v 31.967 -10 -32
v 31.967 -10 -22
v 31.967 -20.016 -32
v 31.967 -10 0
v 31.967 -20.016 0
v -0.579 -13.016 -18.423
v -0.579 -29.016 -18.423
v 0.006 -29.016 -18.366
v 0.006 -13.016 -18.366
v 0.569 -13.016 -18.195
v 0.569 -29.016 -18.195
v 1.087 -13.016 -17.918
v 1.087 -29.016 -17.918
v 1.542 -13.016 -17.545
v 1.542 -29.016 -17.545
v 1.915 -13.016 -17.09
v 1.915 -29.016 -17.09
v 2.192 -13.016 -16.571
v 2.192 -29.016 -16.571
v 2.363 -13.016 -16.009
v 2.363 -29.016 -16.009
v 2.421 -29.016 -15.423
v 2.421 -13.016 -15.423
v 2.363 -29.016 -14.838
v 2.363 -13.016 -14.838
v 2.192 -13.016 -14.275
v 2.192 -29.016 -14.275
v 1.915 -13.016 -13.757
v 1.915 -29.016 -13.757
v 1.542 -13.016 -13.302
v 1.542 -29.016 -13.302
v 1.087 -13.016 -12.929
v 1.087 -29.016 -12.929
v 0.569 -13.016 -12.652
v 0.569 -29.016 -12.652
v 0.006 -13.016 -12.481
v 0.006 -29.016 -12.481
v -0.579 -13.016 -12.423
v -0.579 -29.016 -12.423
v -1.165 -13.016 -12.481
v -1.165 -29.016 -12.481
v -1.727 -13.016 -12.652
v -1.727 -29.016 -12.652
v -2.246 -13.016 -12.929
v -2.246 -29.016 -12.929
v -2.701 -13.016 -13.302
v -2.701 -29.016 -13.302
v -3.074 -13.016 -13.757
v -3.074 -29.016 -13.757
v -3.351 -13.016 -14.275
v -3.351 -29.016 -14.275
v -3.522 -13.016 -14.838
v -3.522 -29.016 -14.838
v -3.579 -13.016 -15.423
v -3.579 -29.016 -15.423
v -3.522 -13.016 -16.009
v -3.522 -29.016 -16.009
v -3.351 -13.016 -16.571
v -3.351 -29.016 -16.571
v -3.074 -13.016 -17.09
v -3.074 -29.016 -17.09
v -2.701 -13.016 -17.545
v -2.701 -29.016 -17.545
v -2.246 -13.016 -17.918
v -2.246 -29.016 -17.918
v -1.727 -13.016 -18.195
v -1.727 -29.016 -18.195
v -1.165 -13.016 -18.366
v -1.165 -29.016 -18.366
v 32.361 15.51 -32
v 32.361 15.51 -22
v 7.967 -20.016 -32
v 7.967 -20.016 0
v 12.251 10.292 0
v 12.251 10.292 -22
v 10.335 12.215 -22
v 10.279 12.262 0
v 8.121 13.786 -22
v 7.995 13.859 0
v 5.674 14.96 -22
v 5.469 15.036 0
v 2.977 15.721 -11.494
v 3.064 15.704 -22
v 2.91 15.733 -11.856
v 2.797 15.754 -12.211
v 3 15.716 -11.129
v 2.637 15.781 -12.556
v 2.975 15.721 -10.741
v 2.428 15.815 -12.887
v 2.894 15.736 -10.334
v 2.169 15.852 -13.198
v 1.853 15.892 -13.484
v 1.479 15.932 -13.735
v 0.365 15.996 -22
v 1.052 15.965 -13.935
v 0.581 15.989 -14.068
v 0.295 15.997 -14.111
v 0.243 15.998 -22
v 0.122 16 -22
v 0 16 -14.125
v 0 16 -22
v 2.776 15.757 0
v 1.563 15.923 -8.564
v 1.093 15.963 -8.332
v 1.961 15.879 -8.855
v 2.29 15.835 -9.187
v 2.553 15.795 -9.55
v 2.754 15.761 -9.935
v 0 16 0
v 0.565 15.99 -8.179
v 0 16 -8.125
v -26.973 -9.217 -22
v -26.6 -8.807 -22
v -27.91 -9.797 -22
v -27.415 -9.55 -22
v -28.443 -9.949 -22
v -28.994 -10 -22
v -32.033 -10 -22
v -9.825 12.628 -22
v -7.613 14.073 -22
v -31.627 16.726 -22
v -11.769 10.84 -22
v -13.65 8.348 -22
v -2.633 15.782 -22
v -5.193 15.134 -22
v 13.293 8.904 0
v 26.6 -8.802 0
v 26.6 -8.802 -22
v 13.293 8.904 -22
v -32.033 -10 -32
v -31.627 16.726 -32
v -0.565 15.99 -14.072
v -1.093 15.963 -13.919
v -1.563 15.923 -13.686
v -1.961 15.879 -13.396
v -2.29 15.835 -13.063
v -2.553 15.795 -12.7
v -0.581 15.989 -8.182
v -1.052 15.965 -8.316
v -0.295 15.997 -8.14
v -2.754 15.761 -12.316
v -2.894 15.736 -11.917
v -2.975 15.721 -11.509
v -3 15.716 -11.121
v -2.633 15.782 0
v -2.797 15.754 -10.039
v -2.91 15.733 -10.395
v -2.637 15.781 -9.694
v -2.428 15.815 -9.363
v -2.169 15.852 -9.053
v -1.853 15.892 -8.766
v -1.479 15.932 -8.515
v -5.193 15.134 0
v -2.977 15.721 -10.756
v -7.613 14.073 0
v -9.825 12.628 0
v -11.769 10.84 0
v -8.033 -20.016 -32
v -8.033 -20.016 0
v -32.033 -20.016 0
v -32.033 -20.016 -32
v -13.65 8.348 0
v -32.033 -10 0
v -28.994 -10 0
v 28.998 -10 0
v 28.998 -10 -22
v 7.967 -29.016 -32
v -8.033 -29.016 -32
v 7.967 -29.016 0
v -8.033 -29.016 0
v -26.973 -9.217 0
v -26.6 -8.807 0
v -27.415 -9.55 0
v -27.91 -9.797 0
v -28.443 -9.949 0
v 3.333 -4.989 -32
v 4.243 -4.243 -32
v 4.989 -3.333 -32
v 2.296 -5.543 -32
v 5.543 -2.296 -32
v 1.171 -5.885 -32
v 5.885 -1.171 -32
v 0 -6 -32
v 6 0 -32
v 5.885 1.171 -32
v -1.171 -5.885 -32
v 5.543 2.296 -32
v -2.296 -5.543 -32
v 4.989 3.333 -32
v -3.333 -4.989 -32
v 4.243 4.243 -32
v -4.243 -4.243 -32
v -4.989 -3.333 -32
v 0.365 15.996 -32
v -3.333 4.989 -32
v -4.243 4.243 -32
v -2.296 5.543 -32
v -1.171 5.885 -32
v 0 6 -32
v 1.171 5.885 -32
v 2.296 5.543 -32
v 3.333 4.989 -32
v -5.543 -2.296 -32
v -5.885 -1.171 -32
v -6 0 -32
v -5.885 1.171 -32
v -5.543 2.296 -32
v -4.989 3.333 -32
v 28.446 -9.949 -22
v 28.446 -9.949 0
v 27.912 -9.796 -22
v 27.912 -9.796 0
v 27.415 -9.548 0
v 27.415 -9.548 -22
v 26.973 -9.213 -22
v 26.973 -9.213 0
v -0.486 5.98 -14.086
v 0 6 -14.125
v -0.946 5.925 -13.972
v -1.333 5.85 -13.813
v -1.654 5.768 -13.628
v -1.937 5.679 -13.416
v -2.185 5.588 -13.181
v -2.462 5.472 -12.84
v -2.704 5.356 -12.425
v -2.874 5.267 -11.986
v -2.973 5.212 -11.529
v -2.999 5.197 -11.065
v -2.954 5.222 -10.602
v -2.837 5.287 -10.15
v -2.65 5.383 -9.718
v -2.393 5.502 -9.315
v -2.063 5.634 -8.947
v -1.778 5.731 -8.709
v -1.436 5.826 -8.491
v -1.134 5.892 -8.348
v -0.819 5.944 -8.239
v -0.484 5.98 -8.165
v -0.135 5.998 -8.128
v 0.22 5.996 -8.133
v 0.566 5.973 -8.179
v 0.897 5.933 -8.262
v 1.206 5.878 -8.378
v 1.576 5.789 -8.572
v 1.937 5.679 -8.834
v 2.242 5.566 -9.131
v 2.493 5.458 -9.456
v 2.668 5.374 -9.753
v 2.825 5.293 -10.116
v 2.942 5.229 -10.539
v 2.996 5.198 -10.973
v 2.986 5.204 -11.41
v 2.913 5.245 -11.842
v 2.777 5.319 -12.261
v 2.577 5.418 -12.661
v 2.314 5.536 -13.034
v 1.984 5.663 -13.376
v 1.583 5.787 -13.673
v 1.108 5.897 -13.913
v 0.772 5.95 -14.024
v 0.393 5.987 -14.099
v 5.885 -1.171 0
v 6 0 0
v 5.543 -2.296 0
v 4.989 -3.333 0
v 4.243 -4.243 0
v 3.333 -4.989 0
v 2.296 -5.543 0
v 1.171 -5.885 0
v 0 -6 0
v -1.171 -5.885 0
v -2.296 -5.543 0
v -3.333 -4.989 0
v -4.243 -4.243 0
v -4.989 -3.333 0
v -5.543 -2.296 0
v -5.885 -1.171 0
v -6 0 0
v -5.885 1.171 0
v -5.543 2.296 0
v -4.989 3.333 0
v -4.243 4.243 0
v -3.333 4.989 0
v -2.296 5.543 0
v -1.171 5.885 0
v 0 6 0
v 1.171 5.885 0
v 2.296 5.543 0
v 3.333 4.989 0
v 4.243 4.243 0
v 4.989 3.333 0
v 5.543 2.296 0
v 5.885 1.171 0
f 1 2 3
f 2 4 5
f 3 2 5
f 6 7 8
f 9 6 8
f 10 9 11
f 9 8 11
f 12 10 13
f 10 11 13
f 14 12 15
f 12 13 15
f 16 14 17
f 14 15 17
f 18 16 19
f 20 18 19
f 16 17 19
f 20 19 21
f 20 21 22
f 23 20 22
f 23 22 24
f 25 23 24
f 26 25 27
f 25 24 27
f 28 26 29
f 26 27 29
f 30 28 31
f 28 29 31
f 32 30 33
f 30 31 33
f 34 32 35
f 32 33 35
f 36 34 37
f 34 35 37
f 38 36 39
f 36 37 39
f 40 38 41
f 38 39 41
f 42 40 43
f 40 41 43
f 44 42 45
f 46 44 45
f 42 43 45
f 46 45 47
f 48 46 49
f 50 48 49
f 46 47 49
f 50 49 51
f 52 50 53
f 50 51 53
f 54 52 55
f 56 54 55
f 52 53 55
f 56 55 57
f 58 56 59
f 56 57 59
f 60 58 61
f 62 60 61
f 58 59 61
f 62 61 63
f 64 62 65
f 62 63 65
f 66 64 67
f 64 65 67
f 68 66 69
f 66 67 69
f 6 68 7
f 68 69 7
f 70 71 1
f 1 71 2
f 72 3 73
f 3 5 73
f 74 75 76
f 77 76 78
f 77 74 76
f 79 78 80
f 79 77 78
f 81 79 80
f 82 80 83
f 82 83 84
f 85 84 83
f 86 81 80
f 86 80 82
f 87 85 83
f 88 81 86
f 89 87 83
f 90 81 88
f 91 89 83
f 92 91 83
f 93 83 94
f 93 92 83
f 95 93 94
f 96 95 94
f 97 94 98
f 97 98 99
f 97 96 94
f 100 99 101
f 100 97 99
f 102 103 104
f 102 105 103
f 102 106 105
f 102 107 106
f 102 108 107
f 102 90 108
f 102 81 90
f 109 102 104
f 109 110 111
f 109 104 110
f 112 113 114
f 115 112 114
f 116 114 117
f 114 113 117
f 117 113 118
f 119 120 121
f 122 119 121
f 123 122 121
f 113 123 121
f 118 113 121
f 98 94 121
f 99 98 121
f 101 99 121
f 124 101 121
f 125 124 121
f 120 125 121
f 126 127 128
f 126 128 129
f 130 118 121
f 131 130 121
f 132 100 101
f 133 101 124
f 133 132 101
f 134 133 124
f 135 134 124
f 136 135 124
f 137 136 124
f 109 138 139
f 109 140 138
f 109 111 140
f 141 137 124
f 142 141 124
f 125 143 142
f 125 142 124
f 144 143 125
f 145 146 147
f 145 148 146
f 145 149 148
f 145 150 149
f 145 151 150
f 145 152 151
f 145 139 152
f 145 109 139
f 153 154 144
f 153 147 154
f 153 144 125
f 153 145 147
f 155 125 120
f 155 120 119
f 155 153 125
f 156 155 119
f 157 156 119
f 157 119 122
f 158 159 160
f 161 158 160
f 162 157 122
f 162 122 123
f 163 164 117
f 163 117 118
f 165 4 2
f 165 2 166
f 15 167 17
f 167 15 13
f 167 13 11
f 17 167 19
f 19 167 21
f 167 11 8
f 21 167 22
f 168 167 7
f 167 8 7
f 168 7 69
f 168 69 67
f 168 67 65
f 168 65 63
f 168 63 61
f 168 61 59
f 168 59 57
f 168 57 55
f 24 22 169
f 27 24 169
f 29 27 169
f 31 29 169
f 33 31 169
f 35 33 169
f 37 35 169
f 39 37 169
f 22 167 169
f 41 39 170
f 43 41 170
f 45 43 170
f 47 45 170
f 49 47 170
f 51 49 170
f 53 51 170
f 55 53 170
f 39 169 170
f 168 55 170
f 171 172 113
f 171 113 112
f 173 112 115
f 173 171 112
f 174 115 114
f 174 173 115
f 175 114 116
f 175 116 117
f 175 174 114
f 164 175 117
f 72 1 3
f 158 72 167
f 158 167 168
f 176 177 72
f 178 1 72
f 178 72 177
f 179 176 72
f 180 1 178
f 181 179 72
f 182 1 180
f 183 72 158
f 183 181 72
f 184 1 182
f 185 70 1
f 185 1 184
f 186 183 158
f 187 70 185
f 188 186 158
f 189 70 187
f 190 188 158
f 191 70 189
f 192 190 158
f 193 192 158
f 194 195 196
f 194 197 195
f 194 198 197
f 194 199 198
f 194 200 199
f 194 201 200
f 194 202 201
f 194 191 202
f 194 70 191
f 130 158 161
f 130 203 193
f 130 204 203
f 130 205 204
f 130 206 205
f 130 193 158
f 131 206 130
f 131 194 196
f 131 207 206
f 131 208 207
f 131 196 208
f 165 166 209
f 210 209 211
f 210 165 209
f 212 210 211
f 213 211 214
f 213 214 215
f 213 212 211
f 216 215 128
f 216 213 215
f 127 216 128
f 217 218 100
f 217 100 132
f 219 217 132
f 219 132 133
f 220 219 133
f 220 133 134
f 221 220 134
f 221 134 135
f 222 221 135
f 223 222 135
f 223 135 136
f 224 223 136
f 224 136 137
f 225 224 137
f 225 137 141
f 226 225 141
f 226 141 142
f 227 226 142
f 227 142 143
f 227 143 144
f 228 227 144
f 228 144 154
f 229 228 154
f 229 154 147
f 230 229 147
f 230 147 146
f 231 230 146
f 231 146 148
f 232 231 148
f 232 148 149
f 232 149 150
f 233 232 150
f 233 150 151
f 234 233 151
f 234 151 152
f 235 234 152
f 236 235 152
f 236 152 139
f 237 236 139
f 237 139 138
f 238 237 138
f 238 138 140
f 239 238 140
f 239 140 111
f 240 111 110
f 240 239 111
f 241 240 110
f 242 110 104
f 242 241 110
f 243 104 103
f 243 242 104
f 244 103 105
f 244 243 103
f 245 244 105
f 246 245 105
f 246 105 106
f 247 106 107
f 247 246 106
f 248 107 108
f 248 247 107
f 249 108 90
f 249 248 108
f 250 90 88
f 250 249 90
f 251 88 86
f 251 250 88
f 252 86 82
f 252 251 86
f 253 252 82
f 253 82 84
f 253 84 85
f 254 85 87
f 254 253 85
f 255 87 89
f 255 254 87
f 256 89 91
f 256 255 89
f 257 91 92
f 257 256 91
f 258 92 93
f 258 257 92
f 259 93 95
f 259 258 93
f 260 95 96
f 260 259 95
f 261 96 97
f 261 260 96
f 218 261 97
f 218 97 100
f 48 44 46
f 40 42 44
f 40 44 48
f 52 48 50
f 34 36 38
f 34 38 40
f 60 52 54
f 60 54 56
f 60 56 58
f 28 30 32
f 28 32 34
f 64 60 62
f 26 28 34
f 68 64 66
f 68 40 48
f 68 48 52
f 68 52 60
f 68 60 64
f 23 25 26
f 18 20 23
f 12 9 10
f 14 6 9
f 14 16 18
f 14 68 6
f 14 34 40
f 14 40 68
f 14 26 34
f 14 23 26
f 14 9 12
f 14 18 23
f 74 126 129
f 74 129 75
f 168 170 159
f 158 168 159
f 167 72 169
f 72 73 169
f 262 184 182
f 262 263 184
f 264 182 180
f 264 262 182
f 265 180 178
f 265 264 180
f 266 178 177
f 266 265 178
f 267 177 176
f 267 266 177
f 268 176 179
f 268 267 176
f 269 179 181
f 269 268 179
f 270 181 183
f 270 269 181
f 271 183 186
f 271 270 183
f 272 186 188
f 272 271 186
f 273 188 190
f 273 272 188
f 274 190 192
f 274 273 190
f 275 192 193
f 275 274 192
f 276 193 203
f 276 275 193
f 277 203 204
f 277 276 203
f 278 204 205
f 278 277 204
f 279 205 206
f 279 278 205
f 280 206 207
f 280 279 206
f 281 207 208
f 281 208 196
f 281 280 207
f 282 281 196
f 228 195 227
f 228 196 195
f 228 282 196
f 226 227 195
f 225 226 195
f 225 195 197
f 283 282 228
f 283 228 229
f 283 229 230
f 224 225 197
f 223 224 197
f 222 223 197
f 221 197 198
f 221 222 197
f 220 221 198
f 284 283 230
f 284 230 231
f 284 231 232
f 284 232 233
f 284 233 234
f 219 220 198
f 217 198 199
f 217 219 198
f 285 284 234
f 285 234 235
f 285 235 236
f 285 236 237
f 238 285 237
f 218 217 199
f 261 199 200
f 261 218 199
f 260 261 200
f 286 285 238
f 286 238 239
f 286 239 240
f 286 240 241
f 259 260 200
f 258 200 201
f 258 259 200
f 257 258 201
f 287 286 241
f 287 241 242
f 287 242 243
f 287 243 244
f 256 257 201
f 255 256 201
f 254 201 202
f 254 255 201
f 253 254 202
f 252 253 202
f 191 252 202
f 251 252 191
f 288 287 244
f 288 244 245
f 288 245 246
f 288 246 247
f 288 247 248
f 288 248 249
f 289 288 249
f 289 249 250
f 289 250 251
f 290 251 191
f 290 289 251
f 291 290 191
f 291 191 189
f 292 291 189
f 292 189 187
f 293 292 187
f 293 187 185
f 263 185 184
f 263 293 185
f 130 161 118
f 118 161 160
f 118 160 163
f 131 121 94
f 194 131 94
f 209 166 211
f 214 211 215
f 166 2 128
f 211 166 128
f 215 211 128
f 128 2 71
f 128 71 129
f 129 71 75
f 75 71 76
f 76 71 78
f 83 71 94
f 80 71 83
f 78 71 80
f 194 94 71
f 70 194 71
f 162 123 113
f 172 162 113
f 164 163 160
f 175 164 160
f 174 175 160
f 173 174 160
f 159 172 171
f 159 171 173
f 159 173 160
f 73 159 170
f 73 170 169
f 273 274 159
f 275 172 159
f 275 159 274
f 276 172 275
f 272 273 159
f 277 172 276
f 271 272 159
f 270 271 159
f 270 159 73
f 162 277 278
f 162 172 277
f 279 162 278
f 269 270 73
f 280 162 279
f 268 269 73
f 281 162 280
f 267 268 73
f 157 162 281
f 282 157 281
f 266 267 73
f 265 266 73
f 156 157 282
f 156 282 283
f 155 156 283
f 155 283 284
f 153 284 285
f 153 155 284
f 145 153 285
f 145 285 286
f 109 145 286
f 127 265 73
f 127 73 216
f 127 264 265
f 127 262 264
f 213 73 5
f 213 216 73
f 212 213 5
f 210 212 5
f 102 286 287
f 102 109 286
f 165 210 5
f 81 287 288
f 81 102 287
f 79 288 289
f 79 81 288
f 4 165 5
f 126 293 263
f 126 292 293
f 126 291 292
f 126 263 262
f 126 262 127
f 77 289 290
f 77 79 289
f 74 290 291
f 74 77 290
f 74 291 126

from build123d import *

# Parameters (mm, degrees)
SKETCH1_R           = 6
BOSS_EXTRUDE1_DEPTH = 22
SKETCH3_R           = 3
CUT_EXTRUDE2_DEPTH  = 22
SKETCH4_R           = 6
BOSS_EXTRUDE2_DEPTH = 10
SKETCH5_R           = 3
CUT_EXTRUDE3_DEPTH  = 16


with BuildPart() as part:
    # Sketch1 → Boss-Extrude1 (new body)
    with BuildSketch(Plane.XY):
        with BuildLine():
            ThreePointArc((12.250598906, 10.291881579), (6.757584433, 14.502932553), (0, 16))
            ThreePointArc((0, 16), (-6.42506456, 14.653277633), (-11.768531852, 10.839818174))
            Line((-11.768531852, 10.839818174), (-13.649705535, 8.347786462))
            Line((-13.649705535, 8.347786462), (-26.599782678, -8.807462524))
            ThreePointArc((-26.599782678, -8.807462524), (-27.656705011, -9.685366602), (-28.994167614, -10))
            Line((-28.994167614, -10), (-32.032992561, -10))
            Line((-32.032992561, -10), (-32.032992561, -20.01649628))
            Line((-32.032992561, -20.01649628), (-27.5, -20.01649628))
            Line((-27.5, -20.01649628), (-8.032992561, -20.01649628))
            Line((-8.032992561, -20.01649628), (-8.032992561, -29.01649628))
            Line((-8.032992561, -29.01649628), (-0.032992561, -29.01649628))
            Line((-0.032992561, -29.01649628), (7.967007439, -29.01649628))
            Line((7.967007439, -29.01649628), (7.967007439, -20.01649628))
            Line((7.967007439, -20.01649628), (27.5, -20.01649628))
            Line((27.5, -20.01649628), (31.967007439, -20.01649628))
            Line((31.967007439, -20.01649628), (31.967007439, -10))
            Line((31.967007439, -10), (28.998198652, -10))
            ThreePointArc((28.998198652, -10), (27.65784727, -9.683925888), (26.599929469, -8.802305447))
            Line((26.599929469, -8.802305447), (13.293285189, 8.904412888))
            Line((13.293285189, 8.904412888), (12.250598906, 10.291881579))
        make_face()
        Circle(SKETCH1_R, mode=Mode.SUBTRACT)
    extrude(amount=-BOSS_EXTRUDE1_DEPTH)

    # Sketch3 → Cut-Extrude2 (cut)
    with BuildSketch(Plane(origin=(0, 0, 0), x_dir=(1, 0, 0), z_dir=(0, 1, 0))):
        with Locations(Location((0, 11.125223176, 0), (0, 0, 90))):
            Circle(SKETCH3_R)
    extrude(amount=CUT_EXTRUDE2_DEPTH, mode=Mode.SUBTRACT)

    # Sketch4 → Boss-Extrude2 (add)
    # profile 1 of 3: a face of its own
    with BuildSketch(Plane(origin=(0, 0, -22), x_dir=(-1, 0, 0), z_dir=(0, 0, -1))):
        with BuildLine():
            ThreePointArc((-12.250598906, 10.291881579), (-6.922536855, 14.424925771), (-0.364905179, 15.99583834))
            Line((-0.364905179, 15.99583834), (-32.361209339, 15.509505054))
            Line((-32.361209339, 15.509505054), (-31.967007439, -10))
            Line((-31.967007439, -10), (-28.998198652, -10))
            ThreePointArc((-28.998198652, -10), (-27.65784727, -9.683925888), (-26.599929469, -8.802305447))
            Line((-26.599929469, -8.802305447), (-12.250598906, 10.291881579))
        make_face()
    # profile 2 of 3: a face of its own
    with BuildSketch(Plane(origin=(0, 0, -22), x_dir=(-1, 0, 0), z_dir=(0, 0, -1))):
        with BuildLine():
            Line((31.626771502, 16.725648698), (-0.364905179, 15.99583834))
            ThreePointArc((-0.364905179, 15.99583834), (6.257540356, 14.725596378), (11.768531852, 10.839818174))
            Line((11.768531852, 10.839818174), (26.599782678, -8.807462524))
            ThreePointArc((26.599782678, -8.807462524), (27.656705011, -9.685366602), (28.994167614, -10))
            Line((28.994167614, -10), (32.032992561, -10))
            Line((32.032992561, -10), (31.626771502, 16.725648698))
        make_face()
    # profile 3 of 3: a face of its own
    with BuildSketch(Plane(origin=(0, 0, -22), x_dir=(-1, 0, 0), z_dir=(0, 0, -1))):
        with BuildLine():
            Line((32.032992561, -10), (28.994167614, -10))
            ThreePointArc((28.994167614, -10), (27.656705011, -9.685366602), (26.599782678, -8.807462524))
            Line((26.599782678, -8.807462524), (11.768531852, 10.839818174))
            ThreePointArc((11.768531852, 10.839818174), (-0.364905179, 15.99583834), (-12.250598906, 10.291881579))
            Line((-12.250598906, 10.291881579), (-26.599929469, -8.802305447))
            ThreePointArc((-26.599929469, -8.802305447), (-27.65784727, -9.683925888), (-28.998198652, -10))
            Line((-28.998198652, -10), (-31.967007439, -10))
            Line((-31.967007439, -10), (-31.967007439, -20.01649628))
            Line((-31.967007439, -20.01649628), (-7.967007439, -20.01649628))
            Line((-7.967007439, -20.01649628), (-7.967007439, -29.01649628))
            Line((-7.967007439, -29.01649628), (8.032992561, -29.01649628))
            Line((8.032992561, -29.01649628), (8.032992561, -20.01649628))
            Line((8.032992561, -20.01649628), (32.032992561, -20.01649628))
            Line((32.032992561, -20.01649628), (32.032992561, -10))
        make_face()
        with Locations(Location((0, 0, 0), (0, 0, 180))):
            Circle(SKETCH4_R, mode=Mode.SUBTRACT)
    extrude(amount=BOSS_EXTRUDE2_DEPTH)

    # Sketch5 → Cut-Extrude3 (cut)
    with BuildSketch(Plane.XZ.offset(29.01649628)):
        with Locations(Location((-0.579448602, -15.423300258, 0), (0, 0, 270))):
            Circle(SKETCH5_R)
    extrude(amount=-CUT_EXTRUDE3_DEPTH, mode=Mode.SUBTRACT)


solid = part.part
